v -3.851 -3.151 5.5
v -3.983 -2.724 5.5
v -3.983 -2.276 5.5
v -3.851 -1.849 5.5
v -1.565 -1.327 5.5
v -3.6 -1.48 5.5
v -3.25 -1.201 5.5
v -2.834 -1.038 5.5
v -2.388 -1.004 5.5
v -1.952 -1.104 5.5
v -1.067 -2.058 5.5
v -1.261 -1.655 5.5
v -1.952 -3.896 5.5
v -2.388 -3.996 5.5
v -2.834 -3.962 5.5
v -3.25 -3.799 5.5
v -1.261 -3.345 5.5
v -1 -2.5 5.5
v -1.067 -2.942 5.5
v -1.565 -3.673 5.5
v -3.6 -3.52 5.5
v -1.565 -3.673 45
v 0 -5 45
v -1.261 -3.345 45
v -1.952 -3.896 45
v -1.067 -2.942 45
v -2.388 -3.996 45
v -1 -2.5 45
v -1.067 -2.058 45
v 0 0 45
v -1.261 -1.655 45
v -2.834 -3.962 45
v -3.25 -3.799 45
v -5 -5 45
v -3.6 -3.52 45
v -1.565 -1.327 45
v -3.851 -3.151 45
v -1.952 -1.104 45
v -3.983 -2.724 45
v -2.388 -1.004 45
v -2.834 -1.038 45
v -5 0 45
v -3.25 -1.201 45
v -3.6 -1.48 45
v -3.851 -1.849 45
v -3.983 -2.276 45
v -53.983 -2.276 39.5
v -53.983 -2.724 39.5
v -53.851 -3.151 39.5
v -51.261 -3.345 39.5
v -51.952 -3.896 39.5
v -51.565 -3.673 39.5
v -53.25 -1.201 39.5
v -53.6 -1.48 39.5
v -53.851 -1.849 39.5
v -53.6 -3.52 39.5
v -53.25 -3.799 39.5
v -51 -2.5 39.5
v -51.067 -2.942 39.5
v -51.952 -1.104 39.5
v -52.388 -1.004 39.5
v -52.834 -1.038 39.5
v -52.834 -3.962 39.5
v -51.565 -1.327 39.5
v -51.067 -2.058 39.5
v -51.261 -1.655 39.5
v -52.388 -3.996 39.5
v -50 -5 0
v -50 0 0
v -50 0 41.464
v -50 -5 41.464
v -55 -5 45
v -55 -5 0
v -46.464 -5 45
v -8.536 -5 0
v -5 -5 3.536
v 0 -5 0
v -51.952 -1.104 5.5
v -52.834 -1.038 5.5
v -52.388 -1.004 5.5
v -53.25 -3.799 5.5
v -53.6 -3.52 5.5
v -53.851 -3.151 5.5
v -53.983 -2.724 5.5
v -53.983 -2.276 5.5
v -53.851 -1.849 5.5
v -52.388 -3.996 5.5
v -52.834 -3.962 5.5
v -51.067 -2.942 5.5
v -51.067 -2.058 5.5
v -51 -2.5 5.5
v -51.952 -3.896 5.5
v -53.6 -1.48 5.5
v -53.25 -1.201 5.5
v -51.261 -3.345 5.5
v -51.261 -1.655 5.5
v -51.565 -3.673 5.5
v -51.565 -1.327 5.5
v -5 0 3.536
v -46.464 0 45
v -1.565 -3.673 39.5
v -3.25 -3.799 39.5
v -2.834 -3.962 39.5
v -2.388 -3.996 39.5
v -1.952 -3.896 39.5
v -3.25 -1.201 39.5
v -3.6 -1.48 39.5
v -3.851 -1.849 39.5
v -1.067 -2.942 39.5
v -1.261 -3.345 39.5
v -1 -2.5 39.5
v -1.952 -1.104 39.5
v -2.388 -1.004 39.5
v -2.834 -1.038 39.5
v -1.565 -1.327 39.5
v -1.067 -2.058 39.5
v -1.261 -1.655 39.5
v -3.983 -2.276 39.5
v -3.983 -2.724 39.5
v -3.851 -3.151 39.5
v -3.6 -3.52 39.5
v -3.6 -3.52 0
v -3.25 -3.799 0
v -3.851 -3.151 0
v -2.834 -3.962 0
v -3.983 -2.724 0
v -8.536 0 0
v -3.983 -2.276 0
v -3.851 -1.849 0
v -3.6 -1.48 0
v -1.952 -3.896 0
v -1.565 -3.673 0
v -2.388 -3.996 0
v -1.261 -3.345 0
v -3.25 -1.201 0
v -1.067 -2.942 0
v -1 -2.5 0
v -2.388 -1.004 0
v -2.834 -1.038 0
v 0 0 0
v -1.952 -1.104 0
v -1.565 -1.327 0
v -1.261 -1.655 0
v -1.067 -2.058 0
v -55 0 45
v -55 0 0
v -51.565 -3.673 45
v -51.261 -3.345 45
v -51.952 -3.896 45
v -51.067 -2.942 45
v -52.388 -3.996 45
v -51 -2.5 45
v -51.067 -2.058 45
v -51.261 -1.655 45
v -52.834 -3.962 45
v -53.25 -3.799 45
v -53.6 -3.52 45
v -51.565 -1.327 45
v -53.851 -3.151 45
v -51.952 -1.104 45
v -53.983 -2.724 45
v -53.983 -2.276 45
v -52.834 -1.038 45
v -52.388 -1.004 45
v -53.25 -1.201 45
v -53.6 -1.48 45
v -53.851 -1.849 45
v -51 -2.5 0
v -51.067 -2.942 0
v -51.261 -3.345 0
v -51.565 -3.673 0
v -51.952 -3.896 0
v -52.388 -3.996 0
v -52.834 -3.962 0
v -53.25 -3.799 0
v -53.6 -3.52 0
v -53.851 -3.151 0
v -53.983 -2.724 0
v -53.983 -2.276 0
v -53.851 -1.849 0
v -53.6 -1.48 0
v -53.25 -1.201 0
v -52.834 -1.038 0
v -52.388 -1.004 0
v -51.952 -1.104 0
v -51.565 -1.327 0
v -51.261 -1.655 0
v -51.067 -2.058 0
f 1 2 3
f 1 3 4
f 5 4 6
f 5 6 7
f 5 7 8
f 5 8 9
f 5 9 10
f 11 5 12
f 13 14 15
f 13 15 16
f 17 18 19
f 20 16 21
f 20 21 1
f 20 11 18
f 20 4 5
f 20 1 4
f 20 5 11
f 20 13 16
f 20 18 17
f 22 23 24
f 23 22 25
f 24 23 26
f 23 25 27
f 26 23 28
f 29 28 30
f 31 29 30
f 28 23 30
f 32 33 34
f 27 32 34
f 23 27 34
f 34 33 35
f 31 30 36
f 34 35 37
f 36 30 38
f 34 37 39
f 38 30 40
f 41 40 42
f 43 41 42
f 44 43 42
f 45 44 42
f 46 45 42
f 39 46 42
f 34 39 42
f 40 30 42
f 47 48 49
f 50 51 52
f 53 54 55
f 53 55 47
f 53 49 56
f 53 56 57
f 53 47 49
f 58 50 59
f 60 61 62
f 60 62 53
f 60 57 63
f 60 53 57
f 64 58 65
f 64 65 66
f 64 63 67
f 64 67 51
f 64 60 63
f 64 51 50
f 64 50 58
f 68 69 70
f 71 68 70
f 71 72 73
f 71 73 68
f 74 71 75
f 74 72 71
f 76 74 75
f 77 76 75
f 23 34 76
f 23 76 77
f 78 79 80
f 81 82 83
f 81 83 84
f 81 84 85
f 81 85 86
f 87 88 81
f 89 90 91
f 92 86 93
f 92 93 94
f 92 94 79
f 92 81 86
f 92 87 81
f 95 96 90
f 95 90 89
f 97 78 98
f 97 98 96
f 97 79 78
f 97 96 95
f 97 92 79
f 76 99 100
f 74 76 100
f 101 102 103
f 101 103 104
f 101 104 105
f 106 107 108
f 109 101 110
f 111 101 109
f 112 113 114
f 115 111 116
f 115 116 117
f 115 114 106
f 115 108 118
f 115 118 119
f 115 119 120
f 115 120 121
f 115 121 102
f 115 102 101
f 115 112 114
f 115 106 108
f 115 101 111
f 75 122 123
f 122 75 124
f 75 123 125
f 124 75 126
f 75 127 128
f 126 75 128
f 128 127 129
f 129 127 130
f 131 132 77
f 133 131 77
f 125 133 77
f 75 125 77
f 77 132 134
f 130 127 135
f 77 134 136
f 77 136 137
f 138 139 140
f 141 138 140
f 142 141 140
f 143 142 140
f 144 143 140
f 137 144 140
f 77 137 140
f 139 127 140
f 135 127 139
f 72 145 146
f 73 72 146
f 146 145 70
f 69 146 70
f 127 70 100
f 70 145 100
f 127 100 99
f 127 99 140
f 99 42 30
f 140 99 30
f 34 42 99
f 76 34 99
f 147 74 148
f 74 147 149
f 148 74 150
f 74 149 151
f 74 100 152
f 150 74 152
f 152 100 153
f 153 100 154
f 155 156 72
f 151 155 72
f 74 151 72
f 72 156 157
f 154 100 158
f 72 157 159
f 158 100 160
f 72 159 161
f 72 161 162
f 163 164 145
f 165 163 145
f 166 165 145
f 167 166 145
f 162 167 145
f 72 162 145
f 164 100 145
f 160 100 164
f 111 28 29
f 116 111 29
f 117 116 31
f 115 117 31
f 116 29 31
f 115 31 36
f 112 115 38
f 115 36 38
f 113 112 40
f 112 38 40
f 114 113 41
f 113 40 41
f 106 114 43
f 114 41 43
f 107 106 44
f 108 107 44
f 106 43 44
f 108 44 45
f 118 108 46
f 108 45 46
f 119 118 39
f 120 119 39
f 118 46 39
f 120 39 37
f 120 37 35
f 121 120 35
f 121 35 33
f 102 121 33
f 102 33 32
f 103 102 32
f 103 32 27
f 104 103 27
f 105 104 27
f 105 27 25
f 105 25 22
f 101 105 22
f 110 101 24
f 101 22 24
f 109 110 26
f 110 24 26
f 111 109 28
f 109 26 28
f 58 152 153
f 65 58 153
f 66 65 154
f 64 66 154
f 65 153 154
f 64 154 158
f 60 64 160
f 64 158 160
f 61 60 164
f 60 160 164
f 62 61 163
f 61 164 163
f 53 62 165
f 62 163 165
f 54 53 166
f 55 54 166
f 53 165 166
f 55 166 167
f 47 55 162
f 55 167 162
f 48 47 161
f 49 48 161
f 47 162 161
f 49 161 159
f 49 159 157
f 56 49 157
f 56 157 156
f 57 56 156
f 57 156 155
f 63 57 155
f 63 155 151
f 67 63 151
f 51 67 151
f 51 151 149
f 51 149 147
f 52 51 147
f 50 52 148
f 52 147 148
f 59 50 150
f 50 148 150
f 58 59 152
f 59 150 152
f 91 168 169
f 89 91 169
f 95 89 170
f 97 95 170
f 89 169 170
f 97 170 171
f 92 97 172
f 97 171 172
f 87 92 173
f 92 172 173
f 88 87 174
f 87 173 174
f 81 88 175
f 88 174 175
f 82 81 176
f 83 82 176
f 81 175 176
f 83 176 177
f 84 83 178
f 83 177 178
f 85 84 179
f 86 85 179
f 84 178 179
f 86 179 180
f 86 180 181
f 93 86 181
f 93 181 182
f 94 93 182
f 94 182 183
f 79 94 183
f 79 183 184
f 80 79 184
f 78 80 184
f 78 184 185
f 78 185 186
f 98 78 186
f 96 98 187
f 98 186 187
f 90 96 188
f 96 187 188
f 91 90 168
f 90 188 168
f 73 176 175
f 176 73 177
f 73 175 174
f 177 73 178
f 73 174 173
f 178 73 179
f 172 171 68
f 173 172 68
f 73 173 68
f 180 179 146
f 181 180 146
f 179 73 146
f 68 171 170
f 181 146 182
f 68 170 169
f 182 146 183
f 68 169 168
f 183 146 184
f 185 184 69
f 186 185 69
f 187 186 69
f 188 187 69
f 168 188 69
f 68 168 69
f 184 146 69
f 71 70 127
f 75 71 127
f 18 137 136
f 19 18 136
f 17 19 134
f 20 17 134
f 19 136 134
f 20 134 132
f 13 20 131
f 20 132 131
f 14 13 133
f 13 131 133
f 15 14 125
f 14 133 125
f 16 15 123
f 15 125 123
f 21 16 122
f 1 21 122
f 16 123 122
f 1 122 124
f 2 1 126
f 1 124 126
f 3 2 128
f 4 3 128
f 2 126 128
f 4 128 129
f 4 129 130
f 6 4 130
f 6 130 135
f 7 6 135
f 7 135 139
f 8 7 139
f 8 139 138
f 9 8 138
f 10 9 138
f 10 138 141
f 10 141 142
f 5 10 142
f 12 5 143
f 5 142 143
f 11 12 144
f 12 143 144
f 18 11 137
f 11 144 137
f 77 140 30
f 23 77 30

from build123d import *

# Parameters (mm, degrees)
F1_DEPTH = 5
F2_R     = 1.5
F2_R_2   = 4.115786
F3_DEPTH = 5.5
F4_R     = 1.5
F5_DEPTH = 5.5


with BuildPart() as f1:
    # F0 (on Front) → F1 (new body)
    with BuildSketch(Plane.XZ):
        Polygon((-46.464466, 45), (-55, 45), (-55, 0), (-50, 0), (-50, 41.464466), (-8.535534, 0), (0, 0), (0, 45), (-5, 45), (-5, 3.535534), align=None)
    extrude(amount=F1_DEPTH)

    # F2 (on face) → F3 (cut)
    with BuildSketch(Plane.XY.offset(45)):
        with Locations((-52.5, -2.5)):
            Circle(F2_R)
        with Locations((-2.5, -2.5)):
            Circle(F2_R)
        with Locations((101.68349, -24.659157)):
            Circle(F2_R_2)
    extrude(amount=-F3_DEPTH, mode=Mode.SUBTRACT)

    # F4 (on face) → F5 (cut)
    with BuildSketch(Plane(origin=(0, 0, 0), x_dir=(1, 0, 0), z_dir=(0, 0, -1))):
        with Locations((-52.5, 2.5)):
            Circle(F4_R)
        with Locations((-2.5, 2.5)):
            Circle(F4_R)
    extrude(amount=-F5_DEPTH, mode=Mode.SUBTRACT)


solid = f1.part
